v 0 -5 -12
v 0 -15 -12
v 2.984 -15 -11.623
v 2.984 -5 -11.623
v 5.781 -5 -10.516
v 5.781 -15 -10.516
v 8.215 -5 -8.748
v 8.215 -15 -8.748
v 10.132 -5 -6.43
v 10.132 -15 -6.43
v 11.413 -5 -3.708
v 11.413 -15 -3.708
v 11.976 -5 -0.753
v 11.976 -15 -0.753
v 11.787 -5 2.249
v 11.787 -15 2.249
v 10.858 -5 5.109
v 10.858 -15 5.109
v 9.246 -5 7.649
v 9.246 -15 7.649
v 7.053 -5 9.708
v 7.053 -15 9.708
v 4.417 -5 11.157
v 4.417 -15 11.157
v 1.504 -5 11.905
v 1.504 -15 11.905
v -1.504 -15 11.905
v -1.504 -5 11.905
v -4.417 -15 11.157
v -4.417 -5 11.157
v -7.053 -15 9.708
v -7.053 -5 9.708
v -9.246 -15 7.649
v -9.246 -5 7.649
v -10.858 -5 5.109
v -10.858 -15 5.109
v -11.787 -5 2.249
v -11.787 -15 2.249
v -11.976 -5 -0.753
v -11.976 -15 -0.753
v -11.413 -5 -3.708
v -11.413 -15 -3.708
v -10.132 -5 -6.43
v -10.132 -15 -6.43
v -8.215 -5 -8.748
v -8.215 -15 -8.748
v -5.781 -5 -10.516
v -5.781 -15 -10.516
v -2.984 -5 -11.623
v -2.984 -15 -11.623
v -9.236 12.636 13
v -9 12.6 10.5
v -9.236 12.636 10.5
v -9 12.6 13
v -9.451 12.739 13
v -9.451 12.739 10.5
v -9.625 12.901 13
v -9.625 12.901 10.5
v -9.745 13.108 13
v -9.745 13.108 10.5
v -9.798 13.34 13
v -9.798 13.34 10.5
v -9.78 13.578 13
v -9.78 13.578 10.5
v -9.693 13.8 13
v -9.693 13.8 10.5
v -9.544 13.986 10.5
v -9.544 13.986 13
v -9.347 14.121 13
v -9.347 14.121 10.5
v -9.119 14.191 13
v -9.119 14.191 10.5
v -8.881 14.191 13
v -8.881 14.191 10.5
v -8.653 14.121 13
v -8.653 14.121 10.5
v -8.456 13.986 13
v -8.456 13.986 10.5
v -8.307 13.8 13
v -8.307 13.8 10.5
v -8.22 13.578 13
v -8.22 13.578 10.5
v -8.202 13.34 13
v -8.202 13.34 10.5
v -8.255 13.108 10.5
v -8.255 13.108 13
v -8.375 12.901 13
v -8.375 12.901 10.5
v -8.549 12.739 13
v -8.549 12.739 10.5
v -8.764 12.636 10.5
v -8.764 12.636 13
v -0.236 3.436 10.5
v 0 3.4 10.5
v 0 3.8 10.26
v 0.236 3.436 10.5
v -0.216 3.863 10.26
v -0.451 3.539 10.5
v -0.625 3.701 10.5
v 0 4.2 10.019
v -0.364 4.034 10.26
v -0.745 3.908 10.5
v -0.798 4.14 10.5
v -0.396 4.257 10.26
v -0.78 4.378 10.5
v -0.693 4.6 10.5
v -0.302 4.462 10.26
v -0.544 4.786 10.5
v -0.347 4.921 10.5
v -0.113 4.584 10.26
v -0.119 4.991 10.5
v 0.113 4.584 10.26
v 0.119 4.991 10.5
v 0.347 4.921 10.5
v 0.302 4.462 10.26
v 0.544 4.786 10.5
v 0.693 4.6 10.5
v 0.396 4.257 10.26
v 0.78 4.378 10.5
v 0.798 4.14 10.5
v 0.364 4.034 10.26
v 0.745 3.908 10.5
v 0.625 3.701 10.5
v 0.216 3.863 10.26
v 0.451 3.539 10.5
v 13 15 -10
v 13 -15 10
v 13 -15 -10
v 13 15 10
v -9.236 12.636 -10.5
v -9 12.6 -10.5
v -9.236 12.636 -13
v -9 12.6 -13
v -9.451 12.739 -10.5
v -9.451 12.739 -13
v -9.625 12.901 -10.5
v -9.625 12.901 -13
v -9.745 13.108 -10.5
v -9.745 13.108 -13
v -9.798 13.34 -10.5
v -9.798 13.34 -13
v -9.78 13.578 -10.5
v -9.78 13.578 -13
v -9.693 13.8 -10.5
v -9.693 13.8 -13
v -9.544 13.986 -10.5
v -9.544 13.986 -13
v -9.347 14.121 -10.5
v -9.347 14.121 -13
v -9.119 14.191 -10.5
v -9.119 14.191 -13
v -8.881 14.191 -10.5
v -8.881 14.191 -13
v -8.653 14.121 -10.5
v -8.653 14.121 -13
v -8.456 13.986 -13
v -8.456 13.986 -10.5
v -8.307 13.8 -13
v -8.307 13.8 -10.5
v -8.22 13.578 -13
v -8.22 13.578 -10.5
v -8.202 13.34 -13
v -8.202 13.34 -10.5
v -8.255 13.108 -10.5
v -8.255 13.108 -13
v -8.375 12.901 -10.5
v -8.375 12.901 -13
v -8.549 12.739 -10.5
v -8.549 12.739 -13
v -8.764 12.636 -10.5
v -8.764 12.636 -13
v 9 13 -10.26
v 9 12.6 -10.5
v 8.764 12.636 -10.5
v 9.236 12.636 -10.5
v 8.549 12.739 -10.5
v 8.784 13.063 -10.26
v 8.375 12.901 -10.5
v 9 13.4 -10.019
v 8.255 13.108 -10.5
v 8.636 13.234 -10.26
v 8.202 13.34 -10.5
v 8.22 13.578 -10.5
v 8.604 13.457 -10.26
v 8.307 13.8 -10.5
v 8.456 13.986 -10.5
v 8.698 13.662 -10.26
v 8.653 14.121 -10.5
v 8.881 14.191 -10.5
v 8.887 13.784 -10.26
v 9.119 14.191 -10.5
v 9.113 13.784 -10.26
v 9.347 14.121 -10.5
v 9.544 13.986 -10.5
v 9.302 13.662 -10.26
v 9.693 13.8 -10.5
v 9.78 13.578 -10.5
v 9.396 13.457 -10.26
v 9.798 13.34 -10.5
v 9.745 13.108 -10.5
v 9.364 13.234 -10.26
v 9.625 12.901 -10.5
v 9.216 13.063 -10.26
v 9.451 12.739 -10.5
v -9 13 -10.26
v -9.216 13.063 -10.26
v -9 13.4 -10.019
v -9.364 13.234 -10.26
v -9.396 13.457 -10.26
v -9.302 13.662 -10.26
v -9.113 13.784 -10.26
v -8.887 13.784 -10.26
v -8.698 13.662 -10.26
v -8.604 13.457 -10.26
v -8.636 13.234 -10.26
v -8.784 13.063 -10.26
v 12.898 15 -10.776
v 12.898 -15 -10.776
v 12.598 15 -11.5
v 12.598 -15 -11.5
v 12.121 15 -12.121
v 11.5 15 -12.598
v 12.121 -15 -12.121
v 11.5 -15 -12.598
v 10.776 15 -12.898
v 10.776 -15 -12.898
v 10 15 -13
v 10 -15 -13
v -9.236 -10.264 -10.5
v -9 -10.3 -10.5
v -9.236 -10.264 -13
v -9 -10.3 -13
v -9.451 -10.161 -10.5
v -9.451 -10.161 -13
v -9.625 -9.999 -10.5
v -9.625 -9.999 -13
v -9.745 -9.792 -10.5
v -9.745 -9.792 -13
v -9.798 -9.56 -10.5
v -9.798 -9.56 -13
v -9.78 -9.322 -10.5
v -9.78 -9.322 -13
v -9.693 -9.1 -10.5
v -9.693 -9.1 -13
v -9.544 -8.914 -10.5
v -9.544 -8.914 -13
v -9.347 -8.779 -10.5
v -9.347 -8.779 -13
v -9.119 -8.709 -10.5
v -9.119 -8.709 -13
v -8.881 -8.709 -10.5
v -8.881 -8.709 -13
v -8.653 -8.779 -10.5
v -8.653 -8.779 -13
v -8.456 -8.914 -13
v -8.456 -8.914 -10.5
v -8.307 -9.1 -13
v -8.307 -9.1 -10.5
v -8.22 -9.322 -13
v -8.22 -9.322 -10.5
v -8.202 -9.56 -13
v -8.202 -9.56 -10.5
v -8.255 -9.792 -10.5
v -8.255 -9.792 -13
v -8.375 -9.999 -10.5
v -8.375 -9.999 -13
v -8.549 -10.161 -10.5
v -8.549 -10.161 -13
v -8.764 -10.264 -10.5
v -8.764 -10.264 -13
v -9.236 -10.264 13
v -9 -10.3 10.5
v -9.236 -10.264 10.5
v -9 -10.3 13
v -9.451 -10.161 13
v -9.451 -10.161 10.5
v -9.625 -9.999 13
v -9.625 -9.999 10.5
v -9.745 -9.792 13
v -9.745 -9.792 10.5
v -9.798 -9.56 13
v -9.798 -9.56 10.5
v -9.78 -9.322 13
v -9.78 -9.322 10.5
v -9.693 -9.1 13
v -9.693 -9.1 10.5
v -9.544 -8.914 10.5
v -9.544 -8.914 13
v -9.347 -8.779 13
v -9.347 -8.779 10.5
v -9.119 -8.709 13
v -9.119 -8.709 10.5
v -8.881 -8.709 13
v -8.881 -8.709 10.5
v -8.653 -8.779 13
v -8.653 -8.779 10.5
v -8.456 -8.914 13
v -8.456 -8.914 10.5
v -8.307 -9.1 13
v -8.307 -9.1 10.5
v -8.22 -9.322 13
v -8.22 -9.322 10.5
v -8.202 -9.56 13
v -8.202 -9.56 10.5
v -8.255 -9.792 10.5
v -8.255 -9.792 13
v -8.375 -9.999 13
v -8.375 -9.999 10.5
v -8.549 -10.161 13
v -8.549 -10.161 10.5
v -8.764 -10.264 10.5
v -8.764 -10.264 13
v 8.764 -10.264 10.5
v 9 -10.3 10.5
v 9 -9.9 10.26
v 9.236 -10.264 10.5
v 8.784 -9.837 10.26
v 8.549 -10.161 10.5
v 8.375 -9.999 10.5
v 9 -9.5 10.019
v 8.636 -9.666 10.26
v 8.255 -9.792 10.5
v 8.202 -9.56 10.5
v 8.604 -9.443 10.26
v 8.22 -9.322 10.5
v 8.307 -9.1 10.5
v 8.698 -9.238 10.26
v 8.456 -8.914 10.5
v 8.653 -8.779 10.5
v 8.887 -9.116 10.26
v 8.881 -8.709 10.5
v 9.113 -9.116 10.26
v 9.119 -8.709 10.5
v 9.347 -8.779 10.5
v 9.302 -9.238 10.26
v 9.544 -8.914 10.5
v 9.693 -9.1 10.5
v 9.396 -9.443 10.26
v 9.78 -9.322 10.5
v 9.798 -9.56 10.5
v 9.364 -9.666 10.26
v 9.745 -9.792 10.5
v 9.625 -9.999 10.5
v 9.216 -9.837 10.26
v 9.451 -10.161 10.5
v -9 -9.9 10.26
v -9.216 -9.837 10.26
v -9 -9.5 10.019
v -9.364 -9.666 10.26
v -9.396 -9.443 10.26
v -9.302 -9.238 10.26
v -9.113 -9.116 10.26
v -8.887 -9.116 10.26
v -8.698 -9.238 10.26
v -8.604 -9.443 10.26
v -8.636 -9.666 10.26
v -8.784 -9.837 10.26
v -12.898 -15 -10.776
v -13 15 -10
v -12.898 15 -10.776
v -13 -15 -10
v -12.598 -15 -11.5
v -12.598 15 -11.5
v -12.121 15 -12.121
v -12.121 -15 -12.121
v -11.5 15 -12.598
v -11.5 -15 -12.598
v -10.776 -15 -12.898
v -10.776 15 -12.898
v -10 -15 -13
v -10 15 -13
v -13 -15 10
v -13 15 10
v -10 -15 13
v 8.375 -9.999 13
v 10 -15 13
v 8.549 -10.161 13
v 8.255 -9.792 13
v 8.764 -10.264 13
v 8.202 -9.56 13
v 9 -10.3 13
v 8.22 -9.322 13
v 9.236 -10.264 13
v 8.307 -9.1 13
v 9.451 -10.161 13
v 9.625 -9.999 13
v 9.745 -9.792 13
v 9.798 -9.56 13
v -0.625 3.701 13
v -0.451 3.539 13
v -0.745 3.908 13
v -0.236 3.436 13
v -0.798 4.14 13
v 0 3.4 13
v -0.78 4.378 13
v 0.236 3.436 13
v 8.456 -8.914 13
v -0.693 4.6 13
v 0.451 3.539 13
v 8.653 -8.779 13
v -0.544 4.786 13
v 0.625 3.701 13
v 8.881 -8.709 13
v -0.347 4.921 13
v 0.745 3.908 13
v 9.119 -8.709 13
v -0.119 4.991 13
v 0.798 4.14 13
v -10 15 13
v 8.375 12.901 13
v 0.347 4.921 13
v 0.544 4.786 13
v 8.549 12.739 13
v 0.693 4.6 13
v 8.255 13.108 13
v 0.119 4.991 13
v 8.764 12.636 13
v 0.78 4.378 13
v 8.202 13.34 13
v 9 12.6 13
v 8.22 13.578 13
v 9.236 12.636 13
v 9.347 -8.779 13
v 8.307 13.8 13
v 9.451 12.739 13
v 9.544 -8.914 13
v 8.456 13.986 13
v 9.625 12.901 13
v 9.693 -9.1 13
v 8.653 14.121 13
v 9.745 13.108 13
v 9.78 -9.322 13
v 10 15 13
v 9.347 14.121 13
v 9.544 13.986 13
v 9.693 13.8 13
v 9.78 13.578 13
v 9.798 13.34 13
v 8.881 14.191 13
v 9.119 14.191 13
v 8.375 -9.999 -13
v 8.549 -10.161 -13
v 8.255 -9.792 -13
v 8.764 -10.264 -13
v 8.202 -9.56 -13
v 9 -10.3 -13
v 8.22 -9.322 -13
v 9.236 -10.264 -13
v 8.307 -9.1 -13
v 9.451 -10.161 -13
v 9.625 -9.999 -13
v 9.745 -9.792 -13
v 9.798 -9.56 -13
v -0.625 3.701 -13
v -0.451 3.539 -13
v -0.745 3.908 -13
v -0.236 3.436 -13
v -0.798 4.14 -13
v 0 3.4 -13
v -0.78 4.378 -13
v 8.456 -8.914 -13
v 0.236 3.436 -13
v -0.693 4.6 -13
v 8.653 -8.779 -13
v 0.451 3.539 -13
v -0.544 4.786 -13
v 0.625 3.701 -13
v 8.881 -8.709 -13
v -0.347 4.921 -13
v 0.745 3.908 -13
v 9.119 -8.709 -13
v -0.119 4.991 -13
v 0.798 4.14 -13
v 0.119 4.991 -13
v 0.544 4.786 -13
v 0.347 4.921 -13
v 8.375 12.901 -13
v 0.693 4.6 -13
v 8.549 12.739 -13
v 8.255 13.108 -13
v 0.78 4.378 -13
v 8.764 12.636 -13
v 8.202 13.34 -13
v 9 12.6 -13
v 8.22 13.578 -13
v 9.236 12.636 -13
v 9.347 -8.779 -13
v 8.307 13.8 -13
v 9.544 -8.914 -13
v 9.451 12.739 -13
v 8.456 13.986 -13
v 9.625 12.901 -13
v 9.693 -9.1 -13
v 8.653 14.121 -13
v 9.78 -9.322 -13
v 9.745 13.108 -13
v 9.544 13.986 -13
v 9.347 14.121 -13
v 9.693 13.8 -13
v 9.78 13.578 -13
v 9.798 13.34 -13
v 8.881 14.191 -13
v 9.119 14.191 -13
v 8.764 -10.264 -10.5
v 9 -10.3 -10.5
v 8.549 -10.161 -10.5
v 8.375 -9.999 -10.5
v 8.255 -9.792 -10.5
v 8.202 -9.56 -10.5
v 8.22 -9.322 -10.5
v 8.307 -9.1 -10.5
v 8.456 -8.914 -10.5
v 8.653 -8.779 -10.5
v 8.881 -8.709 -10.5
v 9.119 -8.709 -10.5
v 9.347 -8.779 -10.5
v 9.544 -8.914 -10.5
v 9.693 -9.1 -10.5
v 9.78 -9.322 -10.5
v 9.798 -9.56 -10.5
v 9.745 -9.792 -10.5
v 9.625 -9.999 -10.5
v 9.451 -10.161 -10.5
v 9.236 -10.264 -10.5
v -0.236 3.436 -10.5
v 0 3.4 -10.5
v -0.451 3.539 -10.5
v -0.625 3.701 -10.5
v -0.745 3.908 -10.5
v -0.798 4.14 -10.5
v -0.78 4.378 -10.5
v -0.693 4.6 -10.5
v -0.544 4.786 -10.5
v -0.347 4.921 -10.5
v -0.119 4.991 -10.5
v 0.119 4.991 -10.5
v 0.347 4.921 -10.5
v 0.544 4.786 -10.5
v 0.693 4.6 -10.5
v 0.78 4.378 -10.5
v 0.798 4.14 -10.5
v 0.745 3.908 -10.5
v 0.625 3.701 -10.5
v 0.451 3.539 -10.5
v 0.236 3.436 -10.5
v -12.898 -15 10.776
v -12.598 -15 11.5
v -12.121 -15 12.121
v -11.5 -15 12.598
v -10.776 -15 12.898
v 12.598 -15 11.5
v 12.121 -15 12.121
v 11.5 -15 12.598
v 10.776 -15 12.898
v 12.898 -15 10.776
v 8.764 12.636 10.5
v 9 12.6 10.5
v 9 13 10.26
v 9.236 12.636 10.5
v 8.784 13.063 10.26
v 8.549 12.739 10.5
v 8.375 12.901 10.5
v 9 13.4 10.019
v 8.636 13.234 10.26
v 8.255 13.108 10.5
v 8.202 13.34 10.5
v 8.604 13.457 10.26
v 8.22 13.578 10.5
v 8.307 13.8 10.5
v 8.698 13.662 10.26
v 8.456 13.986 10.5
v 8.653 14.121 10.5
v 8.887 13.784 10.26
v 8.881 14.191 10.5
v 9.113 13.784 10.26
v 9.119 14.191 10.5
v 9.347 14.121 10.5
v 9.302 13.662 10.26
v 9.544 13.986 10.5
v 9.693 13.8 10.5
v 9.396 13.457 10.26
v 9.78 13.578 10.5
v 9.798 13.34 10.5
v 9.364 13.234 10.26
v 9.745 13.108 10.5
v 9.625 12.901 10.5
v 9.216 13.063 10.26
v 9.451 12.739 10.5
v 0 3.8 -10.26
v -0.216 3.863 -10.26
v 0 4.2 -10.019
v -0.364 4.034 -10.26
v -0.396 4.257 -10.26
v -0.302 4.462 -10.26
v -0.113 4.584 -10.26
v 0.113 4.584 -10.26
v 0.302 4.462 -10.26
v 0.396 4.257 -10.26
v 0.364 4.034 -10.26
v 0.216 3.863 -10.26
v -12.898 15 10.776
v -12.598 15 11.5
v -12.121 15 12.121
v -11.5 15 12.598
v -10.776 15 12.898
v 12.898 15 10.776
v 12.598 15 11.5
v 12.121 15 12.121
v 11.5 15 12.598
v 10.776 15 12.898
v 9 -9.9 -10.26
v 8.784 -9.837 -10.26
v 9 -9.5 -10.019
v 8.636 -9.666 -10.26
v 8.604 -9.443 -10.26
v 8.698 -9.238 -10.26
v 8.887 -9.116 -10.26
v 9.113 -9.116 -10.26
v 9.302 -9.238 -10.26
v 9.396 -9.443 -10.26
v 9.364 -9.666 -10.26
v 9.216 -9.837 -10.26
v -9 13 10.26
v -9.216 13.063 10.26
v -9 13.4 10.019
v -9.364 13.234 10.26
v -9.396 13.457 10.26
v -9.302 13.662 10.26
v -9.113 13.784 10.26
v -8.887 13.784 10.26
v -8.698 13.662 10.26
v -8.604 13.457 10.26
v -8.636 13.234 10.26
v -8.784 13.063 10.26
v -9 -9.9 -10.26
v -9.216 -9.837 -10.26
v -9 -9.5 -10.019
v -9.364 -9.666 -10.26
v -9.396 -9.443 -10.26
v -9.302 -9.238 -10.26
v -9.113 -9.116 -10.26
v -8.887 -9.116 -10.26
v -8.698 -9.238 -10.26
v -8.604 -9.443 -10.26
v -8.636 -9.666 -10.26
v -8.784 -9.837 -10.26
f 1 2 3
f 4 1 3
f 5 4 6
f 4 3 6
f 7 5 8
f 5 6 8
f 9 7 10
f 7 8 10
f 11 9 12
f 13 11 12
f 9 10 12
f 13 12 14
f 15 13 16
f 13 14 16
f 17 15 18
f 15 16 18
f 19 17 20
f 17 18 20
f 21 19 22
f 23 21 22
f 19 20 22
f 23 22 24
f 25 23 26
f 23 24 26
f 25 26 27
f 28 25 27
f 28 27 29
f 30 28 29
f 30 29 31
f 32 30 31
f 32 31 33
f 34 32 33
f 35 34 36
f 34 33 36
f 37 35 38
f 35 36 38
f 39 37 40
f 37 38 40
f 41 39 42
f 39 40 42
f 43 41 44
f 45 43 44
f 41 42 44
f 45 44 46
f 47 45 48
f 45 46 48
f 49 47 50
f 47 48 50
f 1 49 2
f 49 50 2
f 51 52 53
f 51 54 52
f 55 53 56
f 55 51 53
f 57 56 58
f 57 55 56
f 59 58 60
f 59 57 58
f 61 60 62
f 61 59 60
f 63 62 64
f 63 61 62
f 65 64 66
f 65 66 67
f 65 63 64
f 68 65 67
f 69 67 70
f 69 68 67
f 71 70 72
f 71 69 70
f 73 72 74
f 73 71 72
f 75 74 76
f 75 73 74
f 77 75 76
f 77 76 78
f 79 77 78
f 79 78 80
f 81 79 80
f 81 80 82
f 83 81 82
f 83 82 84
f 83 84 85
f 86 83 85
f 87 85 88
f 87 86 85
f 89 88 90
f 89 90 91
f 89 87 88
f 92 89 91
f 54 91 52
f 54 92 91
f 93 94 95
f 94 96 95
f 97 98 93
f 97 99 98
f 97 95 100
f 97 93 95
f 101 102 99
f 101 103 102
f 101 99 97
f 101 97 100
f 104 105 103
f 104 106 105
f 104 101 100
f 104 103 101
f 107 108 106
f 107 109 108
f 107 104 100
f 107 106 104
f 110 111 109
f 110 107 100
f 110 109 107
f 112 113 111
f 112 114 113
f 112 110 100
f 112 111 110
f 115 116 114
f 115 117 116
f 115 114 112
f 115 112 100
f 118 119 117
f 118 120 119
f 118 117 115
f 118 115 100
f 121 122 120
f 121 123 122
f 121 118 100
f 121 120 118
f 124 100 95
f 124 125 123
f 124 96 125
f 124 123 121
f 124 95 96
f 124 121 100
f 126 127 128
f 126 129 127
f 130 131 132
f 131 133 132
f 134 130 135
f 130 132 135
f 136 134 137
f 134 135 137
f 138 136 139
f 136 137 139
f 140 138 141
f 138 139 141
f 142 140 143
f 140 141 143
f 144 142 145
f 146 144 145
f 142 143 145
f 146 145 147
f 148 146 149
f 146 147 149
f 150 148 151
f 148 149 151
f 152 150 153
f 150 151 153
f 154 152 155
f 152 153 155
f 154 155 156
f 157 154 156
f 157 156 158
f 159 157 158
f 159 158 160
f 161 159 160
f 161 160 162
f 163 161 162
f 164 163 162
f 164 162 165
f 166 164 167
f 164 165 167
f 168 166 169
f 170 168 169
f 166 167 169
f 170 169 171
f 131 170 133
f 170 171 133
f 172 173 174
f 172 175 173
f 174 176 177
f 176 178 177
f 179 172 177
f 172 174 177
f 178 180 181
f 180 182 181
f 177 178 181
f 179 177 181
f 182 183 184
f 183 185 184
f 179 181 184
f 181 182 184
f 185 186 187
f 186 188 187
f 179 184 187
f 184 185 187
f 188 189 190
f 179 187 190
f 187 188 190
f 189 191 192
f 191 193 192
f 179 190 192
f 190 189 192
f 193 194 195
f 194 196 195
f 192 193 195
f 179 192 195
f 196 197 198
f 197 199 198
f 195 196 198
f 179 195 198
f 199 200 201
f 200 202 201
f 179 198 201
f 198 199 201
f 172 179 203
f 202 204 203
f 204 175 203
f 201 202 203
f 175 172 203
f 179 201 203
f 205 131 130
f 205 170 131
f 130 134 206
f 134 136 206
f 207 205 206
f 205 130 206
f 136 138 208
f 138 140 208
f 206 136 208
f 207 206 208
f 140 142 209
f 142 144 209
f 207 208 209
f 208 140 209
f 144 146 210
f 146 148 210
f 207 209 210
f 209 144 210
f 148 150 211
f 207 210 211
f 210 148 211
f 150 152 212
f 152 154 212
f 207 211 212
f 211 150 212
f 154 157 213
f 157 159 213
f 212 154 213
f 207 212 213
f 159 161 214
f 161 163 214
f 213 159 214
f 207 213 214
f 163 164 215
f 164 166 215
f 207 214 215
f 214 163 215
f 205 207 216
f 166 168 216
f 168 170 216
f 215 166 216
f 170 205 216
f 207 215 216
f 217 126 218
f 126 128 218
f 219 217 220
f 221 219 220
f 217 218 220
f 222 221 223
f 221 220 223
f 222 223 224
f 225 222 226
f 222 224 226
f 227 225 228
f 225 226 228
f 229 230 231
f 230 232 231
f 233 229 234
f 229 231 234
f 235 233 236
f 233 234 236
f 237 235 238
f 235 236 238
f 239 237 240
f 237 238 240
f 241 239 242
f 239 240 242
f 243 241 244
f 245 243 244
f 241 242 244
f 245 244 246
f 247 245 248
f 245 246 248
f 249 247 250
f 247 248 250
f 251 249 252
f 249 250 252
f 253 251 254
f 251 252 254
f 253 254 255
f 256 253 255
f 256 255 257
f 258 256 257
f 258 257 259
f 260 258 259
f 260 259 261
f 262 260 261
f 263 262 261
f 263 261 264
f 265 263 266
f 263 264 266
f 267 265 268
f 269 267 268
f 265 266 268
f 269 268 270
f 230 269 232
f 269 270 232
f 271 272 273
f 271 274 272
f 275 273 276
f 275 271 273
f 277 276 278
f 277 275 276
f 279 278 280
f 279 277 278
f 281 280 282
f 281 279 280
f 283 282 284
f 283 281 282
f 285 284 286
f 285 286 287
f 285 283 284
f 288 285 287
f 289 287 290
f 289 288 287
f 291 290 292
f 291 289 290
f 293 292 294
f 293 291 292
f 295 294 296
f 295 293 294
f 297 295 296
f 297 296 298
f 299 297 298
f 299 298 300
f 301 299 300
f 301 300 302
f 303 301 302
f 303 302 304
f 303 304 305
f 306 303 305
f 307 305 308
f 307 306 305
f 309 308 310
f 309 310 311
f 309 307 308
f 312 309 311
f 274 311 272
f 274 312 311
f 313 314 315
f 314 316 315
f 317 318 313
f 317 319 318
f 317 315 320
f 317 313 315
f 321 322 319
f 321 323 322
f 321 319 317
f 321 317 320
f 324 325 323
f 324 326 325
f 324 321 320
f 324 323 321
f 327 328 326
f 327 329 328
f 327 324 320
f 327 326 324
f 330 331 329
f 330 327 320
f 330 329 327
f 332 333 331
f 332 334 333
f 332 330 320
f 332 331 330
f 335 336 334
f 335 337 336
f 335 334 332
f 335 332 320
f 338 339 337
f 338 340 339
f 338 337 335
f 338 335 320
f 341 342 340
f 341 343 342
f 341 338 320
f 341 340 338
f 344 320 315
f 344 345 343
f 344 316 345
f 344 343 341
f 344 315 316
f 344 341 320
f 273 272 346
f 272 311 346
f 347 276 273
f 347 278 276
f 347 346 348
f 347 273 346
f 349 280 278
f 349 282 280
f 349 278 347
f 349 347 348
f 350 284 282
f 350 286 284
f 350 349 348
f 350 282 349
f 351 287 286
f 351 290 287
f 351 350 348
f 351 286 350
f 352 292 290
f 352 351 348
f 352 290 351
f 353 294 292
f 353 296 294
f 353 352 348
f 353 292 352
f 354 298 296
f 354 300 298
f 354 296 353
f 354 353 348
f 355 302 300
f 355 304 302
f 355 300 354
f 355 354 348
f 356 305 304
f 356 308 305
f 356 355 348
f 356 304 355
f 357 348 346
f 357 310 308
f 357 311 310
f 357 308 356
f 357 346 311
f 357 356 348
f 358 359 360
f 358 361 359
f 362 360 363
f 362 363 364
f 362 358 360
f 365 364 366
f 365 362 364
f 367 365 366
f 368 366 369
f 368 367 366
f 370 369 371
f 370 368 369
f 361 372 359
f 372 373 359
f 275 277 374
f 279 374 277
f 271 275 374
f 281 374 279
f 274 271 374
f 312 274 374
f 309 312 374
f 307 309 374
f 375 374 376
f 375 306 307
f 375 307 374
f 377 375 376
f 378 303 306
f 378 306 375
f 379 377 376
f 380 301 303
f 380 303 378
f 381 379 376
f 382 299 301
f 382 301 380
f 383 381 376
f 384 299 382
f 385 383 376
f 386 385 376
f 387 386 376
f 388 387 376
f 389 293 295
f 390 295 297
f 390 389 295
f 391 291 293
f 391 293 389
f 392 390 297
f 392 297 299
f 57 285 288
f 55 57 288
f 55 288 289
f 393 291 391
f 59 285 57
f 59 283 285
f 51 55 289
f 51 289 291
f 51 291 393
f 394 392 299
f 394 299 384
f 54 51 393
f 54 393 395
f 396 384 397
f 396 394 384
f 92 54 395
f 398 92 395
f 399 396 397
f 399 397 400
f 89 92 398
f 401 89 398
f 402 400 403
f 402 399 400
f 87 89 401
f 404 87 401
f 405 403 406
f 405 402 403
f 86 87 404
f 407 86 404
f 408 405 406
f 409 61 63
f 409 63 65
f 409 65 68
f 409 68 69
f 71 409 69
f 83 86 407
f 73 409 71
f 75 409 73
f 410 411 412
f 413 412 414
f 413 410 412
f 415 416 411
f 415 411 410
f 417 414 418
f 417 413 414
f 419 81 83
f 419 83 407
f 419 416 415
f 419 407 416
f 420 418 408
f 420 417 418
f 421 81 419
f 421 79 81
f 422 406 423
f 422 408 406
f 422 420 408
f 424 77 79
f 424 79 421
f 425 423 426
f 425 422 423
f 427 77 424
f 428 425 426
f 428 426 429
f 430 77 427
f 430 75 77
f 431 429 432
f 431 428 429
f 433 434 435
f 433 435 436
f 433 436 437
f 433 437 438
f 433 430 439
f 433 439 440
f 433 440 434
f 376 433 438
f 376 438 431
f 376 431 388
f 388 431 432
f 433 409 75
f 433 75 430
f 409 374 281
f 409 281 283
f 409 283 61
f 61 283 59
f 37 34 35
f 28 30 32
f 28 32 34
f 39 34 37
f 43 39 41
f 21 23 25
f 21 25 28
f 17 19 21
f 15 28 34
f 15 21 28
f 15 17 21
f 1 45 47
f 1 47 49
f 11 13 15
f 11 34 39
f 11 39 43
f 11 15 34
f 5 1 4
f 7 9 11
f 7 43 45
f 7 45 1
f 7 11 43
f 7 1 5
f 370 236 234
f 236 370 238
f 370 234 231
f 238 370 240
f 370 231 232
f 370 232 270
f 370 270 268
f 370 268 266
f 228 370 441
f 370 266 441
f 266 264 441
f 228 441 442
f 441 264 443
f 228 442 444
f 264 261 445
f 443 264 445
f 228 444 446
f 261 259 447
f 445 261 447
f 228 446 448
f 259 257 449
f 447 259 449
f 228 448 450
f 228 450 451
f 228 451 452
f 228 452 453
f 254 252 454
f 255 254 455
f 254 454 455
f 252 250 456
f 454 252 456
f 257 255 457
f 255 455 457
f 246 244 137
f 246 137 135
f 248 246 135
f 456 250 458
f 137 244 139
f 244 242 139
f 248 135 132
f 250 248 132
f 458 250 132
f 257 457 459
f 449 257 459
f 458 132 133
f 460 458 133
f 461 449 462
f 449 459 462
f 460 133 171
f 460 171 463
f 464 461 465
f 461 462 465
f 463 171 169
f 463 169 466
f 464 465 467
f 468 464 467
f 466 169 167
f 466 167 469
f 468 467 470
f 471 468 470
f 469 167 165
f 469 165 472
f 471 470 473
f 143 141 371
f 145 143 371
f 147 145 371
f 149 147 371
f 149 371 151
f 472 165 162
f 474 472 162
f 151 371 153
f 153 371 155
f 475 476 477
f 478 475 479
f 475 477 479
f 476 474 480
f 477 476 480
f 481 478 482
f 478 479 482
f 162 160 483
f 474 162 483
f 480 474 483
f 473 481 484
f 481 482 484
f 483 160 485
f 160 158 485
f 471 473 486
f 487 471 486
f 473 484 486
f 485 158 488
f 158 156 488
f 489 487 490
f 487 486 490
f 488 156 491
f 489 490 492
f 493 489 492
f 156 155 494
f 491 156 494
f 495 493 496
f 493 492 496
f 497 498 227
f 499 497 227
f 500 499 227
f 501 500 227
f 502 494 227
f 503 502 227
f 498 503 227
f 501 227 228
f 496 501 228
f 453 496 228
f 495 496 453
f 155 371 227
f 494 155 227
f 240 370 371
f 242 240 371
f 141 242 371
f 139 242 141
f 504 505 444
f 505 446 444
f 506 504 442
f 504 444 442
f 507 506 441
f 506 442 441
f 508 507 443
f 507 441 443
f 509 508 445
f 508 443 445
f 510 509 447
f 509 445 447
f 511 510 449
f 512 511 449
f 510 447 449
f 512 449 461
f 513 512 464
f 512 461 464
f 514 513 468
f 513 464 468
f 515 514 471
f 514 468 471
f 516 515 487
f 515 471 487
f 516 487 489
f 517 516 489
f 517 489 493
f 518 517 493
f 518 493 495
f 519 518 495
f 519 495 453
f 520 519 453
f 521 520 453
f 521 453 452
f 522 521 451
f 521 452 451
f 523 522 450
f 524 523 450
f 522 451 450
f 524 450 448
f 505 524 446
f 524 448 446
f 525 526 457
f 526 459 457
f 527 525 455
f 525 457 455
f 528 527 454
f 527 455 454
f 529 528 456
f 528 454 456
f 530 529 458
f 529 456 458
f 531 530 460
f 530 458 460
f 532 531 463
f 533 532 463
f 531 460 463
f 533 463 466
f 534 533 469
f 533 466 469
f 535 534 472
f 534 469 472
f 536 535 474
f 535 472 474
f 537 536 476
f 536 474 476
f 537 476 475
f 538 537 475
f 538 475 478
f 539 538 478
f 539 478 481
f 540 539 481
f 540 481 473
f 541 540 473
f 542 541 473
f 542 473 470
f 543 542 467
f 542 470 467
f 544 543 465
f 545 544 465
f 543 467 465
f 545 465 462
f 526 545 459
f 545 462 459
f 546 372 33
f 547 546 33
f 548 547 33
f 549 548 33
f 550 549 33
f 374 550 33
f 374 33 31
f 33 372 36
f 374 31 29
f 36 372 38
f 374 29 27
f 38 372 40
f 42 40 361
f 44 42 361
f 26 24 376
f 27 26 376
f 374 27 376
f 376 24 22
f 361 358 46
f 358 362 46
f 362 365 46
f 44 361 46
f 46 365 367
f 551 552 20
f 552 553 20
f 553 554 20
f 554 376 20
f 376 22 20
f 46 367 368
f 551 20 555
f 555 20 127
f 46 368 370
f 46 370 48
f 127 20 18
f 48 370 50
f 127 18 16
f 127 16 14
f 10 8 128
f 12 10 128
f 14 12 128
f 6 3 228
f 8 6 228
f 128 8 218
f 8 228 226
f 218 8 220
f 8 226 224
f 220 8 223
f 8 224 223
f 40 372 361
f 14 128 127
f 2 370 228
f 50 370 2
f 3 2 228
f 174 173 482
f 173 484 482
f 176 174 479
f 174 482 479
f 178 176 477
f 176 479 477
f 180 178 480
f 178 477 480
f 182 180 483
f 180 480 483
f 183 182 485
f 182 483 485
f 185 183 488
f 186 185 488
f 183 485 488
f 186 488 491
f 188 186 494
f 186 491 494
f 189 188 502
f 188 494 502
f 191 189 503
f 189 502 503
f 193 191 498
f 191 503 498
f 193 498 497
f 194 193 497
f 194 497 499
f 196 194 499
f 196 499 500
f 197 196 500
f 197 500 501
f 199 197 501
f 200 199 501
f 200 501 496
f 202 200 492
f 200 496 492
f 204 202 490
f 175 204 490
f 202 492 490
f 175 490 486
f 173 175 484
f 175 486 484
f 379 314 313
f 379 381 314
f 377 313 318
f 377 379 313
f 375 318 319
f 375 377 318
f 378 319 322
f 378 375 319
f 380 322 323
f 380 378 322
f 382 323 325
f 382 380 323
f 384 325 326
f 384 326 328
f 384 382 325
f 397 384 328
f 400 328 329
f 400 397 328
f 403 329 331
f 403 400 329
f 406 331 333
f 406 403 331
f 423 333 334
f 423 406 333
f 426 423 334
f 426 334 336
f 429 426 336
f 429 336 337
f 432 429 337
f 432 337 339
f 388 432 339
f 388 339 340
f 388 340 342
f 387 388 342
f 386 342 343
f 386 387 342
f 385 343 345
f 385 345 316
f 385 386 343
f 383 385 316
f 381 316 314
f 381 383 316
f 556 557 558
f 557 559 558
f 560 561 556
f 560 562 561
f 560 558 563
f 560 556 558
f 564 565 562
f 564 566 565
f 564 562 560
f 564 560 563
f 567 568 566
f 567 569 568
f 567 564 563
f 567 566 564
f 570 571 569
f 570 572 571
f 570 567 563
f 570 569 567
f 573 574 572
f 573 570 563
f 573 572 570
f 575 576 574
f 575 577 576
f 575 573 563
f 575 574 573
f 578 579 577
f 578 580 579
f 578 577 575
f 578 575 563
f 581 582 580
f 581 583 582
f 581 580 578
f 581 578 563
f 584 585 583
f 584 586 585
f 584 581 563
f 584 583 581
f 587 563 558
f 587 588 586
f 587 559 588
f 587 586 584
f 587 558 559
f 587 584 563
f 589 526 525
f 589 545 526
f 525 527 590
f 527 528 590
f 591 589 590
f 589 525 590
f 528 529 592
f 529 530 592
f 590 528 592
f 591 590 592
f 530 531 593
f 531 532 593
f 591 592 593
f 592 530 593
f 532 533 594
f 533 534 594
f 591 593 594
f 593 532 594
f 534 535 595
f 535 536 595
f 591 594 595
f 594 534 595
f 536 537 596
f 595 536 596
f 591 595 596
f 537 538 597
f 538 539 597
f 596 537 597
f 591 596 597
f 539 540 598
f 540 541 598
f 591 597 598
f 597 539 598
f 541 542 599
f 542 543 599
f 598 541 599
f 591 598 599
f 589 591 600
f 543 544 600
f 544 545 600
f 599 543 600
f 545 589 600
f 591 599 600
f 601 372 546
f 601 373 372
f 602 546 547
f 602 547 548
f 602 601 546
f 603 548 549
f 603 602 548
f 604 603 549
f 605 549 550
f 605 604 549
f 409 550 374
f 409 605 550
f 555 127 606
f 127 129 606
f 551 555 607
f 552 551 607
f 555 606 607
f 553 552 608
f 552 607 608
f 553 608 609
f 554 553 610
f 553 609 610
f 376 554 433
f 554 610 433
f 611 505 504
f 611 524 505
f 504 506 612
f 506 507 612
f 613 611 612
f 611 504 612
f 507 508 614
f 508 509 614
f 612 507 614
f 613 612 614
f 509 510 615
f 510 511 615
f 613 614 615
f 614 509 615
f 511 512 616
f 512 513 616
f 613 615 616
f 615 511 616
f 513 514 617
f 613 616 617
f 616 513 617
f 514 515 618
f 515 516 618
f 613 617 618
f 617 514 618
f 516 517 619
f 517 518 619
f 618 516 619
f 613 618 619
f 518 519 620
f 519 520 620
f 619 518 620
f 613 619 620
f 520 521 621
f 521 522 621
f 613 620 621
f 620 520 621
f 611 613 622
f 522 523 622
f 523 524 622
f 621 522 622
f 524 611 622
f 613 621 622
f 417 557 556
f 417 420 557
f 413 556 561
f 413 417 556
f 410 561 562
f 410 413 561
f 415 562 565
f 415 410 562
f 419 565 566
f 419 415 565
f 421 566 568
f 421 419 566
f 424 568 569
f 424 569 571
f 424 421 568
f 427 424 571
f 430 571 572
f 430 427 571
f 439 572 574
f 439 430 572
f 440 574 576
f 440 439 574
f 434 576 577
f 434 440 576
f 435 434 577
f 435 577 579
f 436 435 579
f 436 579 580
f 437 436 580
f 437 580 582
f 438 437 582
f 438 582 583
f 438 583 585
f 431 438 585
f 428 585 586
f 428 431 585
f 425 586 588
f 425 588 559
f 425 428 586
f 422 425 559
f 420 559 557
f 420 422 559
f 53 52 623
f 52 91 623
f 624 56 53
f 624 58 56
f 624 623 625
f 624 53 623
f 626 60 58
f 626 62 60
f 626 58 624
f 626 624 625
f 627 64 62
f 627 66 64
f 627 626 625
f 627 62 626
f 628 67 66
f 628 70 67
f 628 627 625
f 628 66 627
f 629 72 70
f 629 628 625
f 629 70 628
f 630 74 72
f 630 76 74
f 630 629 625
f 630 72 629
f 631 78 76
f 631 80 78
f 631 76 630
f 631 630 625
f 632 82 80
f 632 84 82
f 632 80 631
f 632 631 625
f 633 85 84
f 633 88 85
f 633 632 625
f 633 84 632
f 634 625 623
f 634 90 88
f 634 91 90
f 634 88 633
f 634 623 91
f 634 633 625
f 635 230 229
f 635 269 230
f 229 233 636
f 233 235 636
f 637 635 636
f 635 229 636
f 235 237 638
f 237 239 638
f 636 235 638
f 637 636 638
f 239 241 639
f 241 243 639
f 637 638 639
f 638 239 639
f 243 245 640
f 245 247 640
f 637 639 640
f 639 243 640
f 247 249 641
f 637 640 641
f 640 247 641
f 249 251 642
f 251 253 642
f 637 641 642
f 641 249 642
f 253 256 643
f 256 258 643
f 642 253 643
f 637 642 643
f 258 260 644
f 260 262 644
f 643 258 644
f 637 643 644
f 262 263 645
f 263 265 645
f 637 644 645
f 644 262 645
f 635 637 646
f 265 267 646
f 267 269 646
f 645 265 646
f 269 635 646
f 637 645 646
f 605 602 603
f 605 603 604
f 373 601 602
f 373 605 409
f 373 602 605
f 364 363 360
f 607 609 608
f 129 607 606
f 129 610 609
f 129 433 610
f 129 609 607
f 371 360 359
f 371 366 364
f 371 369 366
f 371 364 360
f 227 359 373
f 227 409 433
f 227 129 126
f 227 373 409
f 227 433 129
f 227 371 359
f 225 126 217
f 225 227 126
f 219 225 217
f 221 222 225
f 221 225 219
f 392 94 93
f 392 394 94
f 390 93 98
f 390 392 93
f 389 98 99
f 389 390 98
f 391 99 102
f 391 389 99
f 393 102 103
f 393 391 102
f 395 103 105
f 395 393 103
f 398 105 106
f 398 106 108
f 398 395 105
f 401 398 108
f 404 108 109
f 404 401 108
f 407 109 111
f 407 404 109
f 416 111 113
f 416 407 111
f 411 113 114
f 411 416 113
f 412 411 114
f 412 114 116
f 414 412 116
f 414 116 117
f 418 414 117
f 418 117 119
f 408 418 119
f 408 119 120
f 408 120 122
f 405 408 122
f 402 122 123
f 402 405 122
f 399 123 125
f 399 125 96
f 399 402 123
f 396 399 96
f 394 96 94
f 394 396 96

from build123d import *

# Parameters (mm, degrees)
SKETCH1_W                  = 26
SKETCH1_H                  = 26
BOSS_EXTRUDE1_DEPTH        = 15
FILLET1_R                  = 3
SKETCH2_R                  = 12
CUT_EXTRUDE1_DEPTH         = 10
M2_TAPPED_HOLE2_AT_2_COUNT = 2
M2_TAPPED_HOLE2_AT_2_PITCH = 18
M2_TAPPED_HOLE2_AT_3_COUNT = 2
M2_TAPPED_HOLE2_AT_3_PITCH = 12.870120435
M2_TAPPED_HOLE2_AT_4_COUNT = 2
M2_TAPPED_HOLE2_AT_4_PITCH = 22.9
M2_TAPPED_HOLE2_AT_5_COUNT = 2
M2_TAPPED_HOLE2_AT_5_PITCH = 29.127478435


with BuildPart() as part:
    # Sketch1 → Boss-Extrude1 (new, symmetric)
    with BuildSketch(Plane(origin=(0, 0, 0), x_dir=(1, 0, 0), z_dir=(0, 1, 0))):
        Rectangle(SKETCH1_W, SKETCH1_H)
    extrude(amount=BOSS_EXTRUDE1_DEPTH, both=True)

    # Fillet1
    fillet1_edges = [part.edges().sort_by_distance(p)[0] for p in [
        (13, 0, 13),
        (-13, 0, 13),
        (-13, 0, -13),
        (13, 0, -13),
    ]]
    fillet(fillet1_edges, radius=FILLET1_R)

    # Sketch2 → Cut-Extrude1 (cut)
    with BuildSketch(Plane.XZ.offset(15)):
        with Locations(Location((0, 0, 0), (0, 0, 270))):
            Circle(SKETCH2_R)
    extrude(amount=-CUT_EXTRUDE1_DEPTH, mode=Mode.SUBTRACT)

    # Sketch4 → M2 Tapped Hole2 (revolve, cut)
    with BuildSketch(Plane(origin=(-9, 13.4, 13), x_dir=(0, -1, 0), z_dir=(1, 0, 0))):
        Polygon((0, 0), (0, 2.980688495), (0.8, 2.5), (0.8, 0), align=None)
    m2_tapped_hole2 = revolve(axis=Axis((-9, 13.4, 19.35), (0, 0, -1)), mode=Mode.SUBTRACT)

    # M2 Tapped Hole2 at 2: M2 Tapped Hole2 ×2
    with Locations(*[(i * M2_TAPPED_HOLE2_AT_2_PITCH, 0, 0) for i in range(1, M2_TAPPED_HOLE2_AT_2_COUNT)]):
        add(m2_tapped_hole2, mode=Mode.SUBTRACT)

    # M2 Tapped Hole2 at 3: M2 Tapped Hole2 ×2
    with Locations(*[Vector(0.6992941554637311, -0.7148340255851474, 0) * (i * M2_TAPPED_HOLE2_AT_3_PITCH) for i in range(1, M2_TAPPED_HOLE2_AT_3_COUNT)]):
        add(m2_tapped_hole2, mode=Mode.SUBTRACT)

    # M2 Tapped Hole2 at 4: M2 Tapped Hole2 ×2
    with Locations(*[(0, -i * M2_TAPPED_HOLE2_AT_4_PITCH, 0) for i in range(1, M2_TAPPED_HOLE2_AT_4_COUNT)]):
        add(m2_tapped_hole2, mode=Mode.SUBTRACT)

    # M2 Tapped Hole2 at 5: M2 Tapped Hole2 ×2
    with Locations(*[Vector(0.6179731637247914, -0.7861991916276512, 0) * (i * M2_TAPPED_HOLE2_AT_5_PITCH) for i in range(1, M2_TAPPED_HOLE2_AT_5_COUNT)]):
        add(m2_tapped_hole2, mode=Mode.SUBTRACT)

    # Mirror1: M2 Tapped Hole2 across plane
    add(m2_tapped_hole2.mirror(Plane.XY), mode=Mode.SUBTRACT)

    # Mirror1 copy 1 sketch → Mirror1 copy 1 (revolve, cut)
    with BuildSketch(Plane(origin=(9, 13.4, -13), x_dir=(0, -1, 0), z_dir=(1, 0, 0))):
        Polygon((0, 0), (0, -2.980688495), (0.8, -2.5), (0.8, 0), align=None)
    revolve(axis=Axis((9, 13.4, -19.35), (0, 0, -1)), mode=Mode.SUBTRACT)

    # Mirror1 copy 2 sketch → Mirror1 copy 2 (revolve, cut)
    with BuildSketch(Plane(origin=(0, 4.2, -13), x_dir=(0, -1, 0), z_dir=(1, 0, 0))):
        Polygon((0, 0), (0, -2.980688495), (0.8, -2.5), (0.8, 0), align=None)
    revolve(axis=Axis((0, 4.2, -19.35), (0, 0, -1)), mode=Mode.SUBTRACT)

    # Mirror1 copy 3 sketch → Mirror1 copy 3 (revolve, cut)
    with BuildSketch(Plane(origin=(-9, -9.5, -13), x_dir=(0, -1, 0), z_dir=(1, 0, 0))):
        Polygon((0, 0), (0, -2.980688495), (0.8, -2.5), (0.8, 0), align=None)
    revolve(axis=Axis((-9, -9.5, -19.35), (0, 0, -1)), mode=Mode.SUBTRACT)

    # Mirror1 copy 4 sketch → Mirror1 copy 4 (revolve, cut)
    with BuildSketch(Plane(origin=(9, -9.5, -13), x_dir=(0, -1, 0), z_dir=(1, 0, 0))):
        Polygon((0, 0), (0, -2.980688495), (0.8, -2.5), (0.8, 0), align=None)
    revolve(axis=Axis((9, -9.5, -19.35), (0, 0, -1)), mode=Mode.SUBTRACT)


solid = part.part
